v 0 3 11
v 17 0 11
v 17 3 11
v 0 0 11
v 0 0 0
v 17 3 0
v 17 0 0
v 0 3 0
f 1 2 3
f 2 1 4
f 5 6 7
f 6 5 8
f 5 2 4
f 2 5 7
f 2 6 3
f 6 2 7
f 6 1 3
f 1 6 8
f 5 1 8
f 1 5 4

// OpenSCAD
// Generated by SolidPython 1.0.1 on 2020-07-29 00:46:56


cube(size = [17, 3, 11]);
/***********************************************
*********      SolidPython code:      **********
************************************************
 
# import packages: SolidPython
from solid import *
from solid.utils import *
from itertools import chain, combinations, permutations


class Resize:

    def __init__(self, scad_file):
        self.scad_file = scad_file
        #self.scad_file = import_scad(scad_file)
        # cone/cylinder param:
        self.r1 = 0
        self.r2 = 0
        self.h = 0
        # rectangular prism param:
        self.w = 0
        self.l = 0
        # ellipse param:
        self.r = 0

    # import OpenScad code (file name corresponds to shape)


    # classify shape + parameters
    def assign(self, param1, param2, param3):
        if self.scad_file == 'cone.scad':
            self.r1 = param1
            self.r2 = param2
            self.h = param3
        elif self.scad_file == 'cylinder.scad':
            self.r1 = param1
            self.r2 = param2
            self.h = param3
        elif self.scad_file == 'rectangularPrism.scad':
            self.h = param1
            self.l = param2
            self.w = param3
        else:
            self.r = param1
            self.h = param2

    # resize parameters
    def iterate(self):
        x = range(3, 20, 2)
        i = 1
        if self.scad_file == 'cone.scad':
            tempList = list(permutations(x, 2))
            for temp in tempList:
                param1 = temp[0]
                param2 = temp[1]
                filepath = 'produced_scad_files/' + 'cone' + str(param1) + '_' + str(param2) + '_' + '.scad'
                scad_render_to_file(cylinder(h=param1, r1=param2, r2=0), filepath)

        elif self.scad_file == 'cylinder.scad':
            tempList = list(permutations(x, 3))
            for temp in tempList:
                param1 = temp[0]
                param2 = temp[1]
                filepath = 'produced_scad_files/' + 'cylinder' + str(param1) + '_' + str(param2) + '_' + '.scad'
                scad_render_to_file(cylinder(h=param1, r1=param2, r2=param2), filepath)

        elif self.scad_file == 'rectangularPrism.scad':
            tempList = list(permutations(x, 3))
            for temp in tempList:
                param1 = temp[0]
                param2 = temp[1]
                param3 = temp[2]
                filepath = 'produced_scad_files/' + 'rectangularPrism' + str(param1) + '_' + str(param2) + '_' + str(
                    param3) + '.scad'
                scad_render_to_file(cube(size=(param1, param2, param3)), filepath)

        elif self.scad_file == 'ellipse.scad':
            tempList = list(permutations(x, 4))
            for temp in tempList:
                param1 = temp[0]
                param2 = temp[1]
                param3 = temp[2]
                param4 = temp[3]
                filepath = 'produced_scad_files/' + 'ellipse' + str(param1) + '_' + str(param2) + '_' + str(param3) + '_' + str(param4) + '.scad'
                scad_render_to_file(scale([param1, param2, param3])(sphere(r=param4)), filepath)

    def render_to_scadfile(self):
        scad_render_to_file(scad, 'example.scad') 
 
************************************************/
